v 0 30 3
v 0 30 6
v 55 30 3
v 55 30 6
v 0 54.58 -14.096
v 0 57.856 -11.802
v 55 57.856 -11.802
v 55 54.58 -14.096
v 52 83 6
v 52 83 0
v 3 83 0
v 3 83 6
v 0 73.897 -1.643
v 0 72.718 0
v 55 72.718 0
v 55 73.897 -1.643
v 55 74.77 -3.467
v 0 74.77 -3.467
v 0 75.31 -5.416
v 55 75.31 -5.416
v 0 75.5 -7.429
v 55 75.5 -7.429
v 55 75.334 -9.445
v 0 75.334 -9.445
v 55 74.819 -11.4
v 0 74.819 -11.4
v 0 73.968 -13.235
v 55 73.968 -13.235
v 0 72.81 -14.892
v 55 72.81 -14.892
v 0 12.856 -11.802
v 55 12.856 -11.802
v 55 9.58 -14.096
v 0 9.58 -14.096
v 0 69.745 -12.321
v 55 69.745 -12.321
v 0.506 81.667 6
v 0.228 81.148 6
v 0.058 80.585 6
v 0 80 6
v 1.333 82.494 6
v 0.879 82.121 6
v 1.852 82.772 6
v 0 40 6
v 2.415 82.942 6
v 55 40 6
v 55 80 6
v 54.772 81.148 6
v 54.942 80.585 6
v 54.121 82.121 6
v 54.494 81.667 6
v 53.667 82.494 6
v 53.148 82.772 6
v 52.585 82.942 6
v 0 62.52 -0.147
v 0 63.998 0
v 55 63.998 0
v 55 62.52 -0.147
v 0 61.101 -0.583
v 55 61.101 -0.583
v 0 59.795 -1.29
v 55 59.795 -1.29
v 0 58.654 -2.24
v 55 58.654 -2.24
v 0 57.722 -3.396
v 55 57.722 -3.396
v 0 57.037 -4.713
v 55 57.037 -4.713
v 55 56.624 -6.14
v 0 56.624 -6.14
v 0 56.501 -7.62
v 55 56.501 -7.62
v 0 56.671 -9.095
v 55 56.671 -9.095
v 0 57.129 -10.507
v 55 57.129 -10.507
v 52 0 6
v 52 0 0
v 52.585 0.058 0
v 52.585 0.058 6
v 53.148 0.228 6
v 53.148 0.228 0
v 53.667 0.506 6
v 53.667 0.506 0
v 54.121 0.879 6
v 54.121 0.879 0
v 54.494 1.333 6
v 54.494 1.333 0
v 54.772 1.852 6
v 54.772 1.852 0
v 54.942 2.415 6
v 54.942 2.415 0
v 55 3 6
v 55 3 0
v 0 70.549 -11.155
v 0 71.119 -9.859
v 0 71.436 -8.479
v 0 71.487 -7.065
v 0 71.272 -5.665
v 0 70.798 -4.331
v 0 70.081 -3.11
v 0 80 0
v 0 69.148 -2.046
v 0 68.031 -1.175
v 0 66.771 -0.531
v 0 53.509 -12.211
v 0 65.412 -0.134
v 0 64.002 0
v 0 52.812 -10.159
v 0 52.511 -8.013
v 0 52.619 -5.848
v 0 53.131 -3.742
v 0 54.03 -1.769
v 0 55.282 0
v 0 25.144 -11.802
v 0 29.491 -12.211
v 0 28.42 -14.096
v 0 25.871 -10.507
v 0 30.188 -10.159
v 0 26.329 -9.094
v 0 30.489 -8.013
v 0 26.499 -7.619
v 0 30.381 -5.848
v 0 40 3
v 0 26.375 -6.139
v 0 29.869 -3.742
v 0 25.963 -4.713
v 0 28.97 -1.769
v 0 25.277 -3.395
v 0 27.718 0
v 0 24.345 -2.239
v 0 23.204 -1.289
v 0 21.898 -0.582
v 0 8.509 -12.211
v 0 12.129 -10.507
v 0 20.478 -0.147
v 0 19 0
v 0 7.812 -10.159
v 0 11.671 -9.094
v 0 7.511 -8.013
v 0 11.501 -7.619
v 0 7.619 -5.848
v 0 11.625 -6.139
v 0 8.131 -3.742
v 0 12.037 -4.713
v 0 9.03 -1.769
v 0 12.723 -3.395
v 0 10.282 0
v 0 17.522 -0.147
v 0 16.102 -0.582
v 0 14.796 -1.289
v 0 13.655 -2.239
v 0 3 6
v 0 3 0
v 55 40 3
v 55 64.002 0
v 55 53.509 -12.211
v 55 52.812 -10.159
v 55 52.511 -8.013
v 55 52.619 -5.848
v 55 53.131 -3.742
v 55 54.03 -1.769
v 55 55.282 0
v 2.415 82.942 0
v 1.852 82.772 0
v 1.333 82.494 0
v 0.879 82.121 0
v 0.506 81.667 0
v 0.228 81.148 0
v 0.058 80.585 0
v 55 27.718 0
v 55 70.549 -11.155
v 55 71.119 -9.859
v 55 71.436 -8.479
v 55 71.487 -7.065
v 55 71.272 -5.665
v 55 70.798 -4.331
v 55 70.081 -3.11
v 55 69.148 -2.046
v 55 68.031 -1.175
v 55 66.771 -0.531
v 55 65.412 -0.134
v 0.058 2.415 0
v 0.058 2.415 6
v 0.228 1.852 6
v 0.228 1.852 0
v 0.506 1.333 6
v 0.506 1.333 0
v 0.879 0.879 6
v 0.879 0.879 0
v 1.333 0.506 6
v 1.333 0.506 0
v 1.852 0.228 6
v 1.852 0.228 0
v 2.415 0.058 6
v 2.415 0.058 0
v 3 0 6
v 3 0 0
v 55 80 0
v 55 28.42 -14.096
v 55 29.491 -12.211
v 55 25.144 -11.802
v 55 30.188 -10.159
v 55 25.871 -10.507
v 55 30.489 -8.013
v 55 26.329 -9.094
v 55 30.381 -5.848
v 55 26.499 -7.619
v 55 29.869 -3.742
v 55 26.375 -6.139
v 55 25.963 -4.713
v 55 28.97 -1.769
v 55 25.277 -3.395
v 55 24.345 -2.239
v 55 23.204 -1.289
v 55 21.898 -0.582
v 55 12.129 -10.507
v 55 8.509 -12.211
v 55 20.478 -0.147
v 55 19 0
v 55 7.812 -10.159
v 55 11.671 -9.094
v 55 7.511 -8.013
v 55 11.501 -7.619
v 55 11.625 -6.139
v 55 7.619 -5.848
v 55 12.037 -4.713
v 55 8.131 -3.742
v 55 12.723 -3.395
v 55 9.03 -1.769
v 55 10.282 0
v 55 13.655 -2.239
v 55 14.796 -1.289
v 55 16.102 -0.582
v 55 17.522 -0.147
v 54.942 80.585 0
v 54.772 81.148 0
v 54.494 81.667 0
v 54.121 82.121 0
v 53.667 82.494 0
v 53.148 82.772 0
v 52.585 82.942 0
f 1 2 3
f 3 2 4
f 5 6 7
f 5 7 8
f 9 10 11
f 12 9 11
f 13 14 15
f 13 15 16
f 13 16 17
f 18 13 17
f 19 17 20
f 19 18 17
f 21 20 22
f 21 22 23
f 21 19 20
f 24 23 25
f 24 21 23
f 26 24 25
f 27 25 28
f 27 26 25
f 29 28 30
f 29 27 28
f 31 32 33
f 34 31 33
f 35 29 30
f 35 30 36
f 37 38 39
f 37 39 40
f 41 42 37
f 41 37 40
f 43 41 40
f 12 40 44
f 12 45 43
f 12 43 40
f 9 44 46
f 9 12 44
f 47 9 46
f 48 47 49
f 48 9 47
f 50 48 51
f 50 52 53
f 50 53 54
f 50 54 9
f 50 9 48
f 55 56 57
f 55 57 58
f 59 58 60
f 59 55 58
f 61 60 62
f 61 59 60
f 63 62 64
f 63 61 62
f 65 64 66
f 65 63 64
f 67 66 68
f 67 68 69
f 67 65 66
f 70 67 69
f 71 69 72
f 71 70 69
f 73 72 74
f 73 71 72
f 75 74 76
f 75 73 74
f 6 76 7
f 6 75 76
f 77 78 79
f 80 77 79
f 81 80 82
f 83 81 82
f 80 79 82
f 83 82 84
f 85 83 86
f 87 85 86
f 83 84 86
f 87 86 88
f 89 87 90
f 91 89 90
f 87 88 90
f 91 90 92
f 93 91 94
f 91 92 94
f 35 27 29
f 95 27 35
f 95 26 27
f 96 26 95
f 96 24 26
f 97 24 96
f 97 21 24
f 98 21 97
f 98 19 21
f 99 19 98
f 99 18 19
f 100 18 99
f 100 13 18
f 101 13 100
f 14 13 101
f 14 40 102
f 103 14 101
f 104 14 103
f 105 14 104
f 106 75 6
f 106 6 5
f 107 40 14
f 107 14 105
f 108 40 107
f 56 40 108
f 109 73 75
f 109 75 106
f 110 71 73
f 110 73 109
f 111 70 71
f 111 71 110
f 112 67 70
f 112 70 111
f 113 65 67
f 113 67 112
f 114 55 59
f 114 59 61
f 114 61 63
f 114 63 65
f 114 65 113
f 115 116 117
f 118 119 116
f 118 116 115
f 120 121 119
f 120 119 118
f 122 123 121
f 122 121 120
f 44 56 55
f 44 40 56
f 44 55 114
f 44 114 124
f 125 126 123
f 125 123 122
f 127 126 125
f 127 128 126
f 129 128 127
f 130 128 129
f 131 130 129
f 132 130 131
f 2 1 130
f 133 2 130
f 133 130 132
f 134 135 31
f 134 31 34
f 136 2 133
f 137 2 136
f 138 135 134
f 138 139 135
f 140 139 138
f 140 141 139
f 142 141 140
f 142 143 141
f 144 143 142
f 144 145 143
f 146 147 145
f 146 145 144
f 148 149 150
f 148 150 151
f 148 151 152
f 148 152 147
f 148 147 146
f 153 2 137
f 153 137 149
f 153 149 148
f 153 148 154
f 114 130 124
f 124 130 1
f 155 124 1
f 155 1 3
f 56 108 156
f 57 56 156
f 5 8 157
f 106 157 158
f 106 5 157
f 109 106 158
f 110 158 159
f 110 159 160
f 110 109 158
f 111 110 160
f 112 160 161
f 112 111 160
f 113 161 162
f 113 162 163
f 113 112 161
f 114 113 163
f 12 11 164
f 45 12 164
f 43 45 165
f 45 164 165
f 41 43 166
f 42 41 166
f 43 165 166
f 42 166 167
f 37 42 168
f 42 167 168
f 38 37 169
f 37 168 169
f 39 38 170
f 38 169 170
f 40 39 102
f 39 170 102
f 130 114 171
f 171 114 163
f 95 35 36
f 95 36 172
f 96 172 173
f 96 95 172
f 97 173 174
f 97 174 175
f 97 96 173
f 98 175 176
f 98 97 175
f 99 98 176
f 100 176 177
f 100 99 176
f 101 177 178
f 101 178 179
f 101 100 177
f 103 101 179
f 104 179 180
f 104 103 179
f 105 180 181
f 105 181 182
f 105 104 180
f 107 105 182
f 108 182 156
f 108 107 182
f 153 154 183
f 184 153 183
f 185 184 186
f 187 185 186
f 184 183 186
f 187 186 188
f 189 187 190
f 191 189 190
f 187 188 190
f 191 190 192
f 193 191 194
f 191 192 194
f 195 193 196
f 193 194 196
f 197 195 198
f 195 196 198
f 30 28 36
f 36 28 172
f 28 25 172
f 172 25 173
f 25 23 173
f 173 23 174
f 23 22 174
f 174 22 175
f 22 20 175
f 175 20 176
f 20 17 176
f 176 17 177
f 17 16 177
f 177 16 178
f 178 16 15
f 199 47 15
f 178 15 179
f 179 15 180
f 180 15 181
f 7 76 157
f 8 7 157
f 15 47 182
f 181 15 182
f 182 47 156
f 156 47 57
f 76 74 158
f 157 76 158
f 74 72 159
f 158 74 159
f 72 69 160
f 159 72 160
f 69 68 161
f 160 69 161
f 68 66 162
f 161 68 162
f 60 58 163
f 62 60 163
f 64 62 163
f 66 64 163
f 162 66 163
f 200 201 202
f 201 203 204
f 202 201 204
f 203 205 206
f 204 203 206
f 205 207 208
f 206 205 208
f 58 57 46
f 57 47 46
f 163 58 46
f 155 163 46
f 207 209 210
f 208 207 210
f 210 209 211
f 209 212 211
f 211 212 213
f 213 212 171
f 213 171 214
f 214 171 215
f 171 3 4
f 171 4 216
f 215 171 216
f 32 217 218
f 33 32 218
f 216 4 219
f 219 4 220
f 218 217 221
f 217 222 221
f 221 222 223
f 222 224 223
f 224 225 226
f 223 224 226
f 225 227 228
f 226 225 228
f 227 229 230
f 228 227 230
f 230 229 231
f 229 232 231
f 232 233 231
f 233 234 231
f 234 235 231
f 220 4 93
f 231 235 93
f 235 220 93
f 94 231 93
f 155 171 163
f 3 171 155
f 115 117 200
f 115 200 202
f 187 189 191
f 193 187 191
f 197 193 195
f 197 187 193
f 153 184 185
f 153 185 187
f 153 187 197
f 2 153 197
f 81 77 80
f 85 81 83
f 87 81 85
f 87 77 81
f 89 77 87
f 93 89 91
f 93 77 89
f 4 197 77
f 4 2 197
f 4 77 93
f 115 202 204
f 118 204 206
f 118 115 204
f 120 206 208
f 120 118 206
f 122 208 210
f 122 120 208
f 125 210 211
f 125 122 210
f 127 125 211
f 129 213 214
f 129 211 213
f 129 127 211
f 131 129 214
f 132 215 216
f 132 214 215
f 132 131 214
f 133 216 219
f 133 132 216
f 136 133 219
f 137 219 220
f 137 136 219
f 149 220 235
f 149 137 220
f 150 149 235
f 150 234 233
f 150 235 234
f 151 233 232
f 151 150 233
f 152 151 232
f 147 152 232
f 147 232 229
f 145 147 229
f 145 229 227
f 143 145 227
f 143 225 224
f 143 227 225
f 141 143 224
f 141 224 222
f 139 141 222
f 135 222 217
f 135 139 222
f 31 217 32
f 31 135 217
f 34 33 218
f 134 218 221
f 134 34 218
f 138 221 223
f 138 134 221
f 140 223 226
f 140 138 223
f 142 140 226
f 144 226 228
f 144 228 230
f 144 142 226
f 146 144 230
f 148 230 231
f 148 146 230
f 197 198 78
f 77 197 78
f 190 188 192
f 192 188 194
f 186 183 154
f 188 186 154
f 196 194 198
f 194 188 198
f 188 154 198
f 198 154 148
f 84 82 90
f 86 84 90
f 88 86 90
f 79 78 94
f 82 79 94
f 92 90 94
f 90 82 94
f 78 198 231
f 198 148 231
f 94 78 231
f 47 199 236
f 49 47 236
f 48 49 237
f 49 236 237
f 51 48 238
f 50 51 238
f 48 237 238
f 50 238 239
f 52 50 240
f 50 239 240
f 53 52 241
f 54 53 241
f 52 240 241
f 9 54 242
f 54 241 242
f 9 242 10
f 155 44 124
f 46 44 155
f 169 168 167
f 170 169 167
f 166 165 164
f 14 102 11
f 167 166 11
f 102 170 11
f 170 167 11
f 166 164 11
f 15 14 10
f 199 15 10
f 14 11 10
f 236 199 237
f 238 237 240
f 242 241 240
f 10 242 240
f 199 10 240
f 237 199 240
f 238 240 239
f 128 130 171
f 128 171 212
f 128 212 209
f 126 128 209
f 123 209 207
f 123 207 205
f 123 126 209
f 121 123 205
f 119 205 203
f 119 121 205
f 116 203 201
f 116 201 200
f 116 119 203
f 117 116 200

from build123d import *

# Parameters (mm, degrees)
F1_DEPTH = 6
F2_W     = 55
F2_H     = 10
F3_DEPTH = 3
F5_DEPTH = 55


with BuildPart() as f1:
    # F0 (on Top) → F1 (new body)
    with BuildSketch(Plane.XY):
        with BuildLine():
            ThreePointArc((0, 3), (0.87868, 0.87868), (3, 0))
            Line((3, 0), (52, 0))
            ThreePointArc((52, 0), (54.12132, 0.87868), (55, 3))
            Line((55, 3), (55, 80))
            ThreePointArc((55, 80), (54.12132, 82.12132), (52, 83))
            Line((52, 83), (3, 83))
            ThreePointArc((3, 83), (0.87868, 82.12132), (0, 80))
            Line((0, 80), (0, 3))
        make_face()
    extrude(amount=F1_DEPTH)

    # F2 (on face) → F3 (cut)
    with BuildSketch(Plane.XY.offset(6)):
        with Locations((27.5, 35)):
            Rectangle(F2_W, F2_H)
    extrude(amount=-F3_DEPTH, mode=Mode.SUBTRACT)

    # F4 (on face) → F5 (join, through all)
    with BuildSketch(Plane(origin=(0, 0, 0), x_dir=(0, -1, 0), z_dir=(-1, 0, 0))):
        with BuildLine():
            ThreePointArc((-69.745333, -12.320907), (-64.327145, -0.007138), (-57.85636, -11.801823))
            Line((-57.85636, -11.801823), (-54.579751, -14.096129))
            ThreePointArc((-54.579751, -14.096129), (-64.501623, 3.989055), (-72.809511, -14.892058))
            Line((-72.809511, -14.892058), (-69.745333, -12.320907))
        make_face()
        with BuildLine():
            ThreePointArc((-25.14364, -11.801823), (-19, 0), (-12.85636, -11.801823))
            Line((-12.85636, -11.801823), (-9.579751, -14.096129))
            ThreePointArc((-9.579751, -14.096129), (-19, 4), (-28.420249, -14.096129))
            Line((-28.420249, -14.096129), (-25.14364, -11.801823))
        make_face()
    extrude(amount=-F5_DEPTH)


solid = f1.part
